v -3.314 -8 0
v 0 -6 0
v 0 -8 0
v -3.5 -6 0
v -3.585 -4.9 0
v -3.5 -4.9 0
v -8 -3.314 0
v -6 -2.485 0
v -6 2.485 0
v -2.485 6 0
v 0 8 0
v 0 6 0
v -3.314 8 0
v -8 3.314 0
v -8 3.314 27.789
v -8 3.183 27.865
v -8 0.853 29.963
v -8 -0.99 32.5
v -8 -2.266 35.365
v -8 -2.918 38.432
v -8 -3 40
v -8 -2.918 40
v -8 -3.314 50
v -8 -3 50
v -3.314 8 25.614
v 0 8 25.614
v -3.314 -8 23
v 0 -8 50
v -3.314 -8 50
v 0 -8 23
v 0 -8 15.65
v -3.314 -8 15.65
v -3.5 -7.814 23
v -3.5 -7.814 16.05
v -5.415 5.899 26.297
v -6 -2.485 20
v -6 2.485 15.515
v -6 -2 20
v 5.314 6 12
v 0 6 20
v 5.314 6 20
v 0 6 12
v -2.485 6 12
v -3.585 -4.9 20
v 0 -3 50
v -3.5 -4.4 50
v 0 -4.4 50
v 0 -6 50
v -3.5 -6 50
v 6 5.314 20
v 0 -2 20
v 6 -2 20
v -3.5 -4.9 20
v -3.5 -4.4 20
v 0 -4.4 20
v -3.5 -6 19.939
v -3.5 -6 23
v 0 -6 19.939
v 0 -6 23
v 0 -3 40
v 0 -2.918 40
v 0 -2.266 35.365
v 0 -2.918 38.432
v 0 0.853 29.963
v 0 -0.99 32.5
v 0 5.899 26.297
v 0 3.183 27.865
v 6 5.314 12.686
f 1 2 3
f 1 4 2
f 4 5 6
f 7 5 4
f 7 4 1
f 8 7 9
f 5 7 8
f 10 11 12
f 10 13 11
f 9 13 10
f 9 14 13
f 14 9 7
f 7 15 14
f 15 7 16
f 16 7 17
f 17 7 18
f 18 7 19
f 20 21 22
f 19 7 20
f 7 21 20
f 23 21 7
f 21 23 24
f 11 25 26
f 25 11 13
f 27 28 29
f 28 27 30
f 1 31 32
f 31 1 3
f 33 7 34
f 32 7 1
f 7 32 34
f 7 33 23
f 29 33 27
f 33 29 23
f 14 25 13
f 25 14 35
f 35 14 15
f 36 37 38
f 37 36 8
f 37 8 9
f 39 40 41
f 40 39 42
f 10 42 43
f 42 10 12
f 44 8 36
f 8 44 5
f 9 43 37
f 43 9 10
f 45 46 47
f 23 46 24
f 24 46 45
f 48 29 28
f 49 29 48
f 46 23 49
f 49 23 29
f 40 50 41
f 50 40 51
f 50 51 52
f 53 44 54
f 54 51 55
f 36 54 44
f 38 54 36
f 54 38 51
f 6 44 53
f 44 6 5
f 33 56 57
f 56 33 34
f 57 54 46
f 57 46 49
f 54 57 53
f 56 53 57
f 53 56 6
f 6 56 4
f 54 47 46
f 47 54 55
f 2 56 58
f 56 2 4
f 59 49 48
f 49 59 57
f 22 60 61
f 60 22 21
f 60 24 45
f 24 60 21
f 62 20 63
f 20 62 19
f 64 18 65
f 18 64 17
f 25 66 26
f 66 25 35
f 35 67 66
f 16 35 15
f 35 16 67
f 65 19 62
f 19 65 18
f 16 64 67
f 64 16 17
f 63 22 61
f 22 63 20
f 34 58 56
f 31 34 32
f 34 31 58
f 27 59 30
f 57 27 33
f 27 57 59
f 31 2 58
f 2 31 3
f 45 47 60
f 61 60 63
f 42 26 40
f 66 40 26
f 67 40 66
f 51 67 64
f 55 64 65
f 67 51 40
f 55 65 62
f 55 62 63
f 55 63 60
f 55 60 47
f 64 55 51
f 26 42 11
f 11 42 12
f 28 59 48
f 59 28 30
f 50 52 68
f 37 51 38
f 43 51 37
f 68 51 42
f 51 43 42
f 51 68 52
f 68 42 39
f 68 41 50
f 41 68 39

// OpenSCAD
// An attempt at a hoctagonal tin whistle
module octocyl(r=5,length=60) {

	xd=2*sqrt(r*r/2);

	difference() {


		translate([-r,-r,0]) cube([2*r,2*r,length]);



		translate([xd,xd,0])   rotate([0,0,45]) translate([-r,-r,0]) cube([2*r,2*r,length]);
		translate([-xd,-xd,0]) rotate([0,0,45]) translate([-r,-r,0]) cube([2*r,2*r,length]);
		translate([-xd,xd,0])  rotate([0,0,45]) translate([-r,-r,0]) cube([2*r,2*r,length]);
		translate([xd,-xd,0])  rotate([0,0,45]) translate([-r,-r,0]) cube([2*r,2*r,length]);
	}
}

module octotube(r1=5, r2=4,length=60) {

	difference() {
		octocyl(r1,length);
		octocyl(r2,length);
	}

}

	
module bottom(length) {
	translate([-80,0,0]) difference() {
		octotube(r1=20,r2=14,length=l);
		translate([0,0,l-10]) octotube(r1=17,r2=14,length=l);
	}
}
 	
module middle(length) {

	translate([-180,0,0]) difference() {
		octotube(r1=20,r2=14,length=l);
		translate([0,0,l-10]) octotube(r1=20,r2=17,length=l);
	}
}


module fipbase(radius,length) {
	difference() {

		union() {
			//octotube(r1=radius,r2=radius-2,length=20);
			translate([0,0,0]) octotube(r1=radius,r2=radius-2,length=length+20);
		
			// backstop and mouthpeice 
			translate([0,0,length]) octocyl(r=radius,length=30);
			
			//windhole extrude
			translate([-(radius)/2,-radius+1.5,0]) cube([radius,radius/5,length]);	 	}

		// Windhole
		translate([-(radius-1)/2,-radius+2,0]) cube([radius-1,radius/5,100]);

		// Mouthpeice cutaway
		translate([-30,-3,length+20]) cube([60,60,60]);
		translate([-30,12,length+20]) rotate([0,90,0]) cylinder(r=15,h=60);  
		translate([-30,41,length+20]) rotate([45,0,0]) cube([60,60,60]);


	}
}

module hole(r) {
	width=r-1;
	translate([-width/2,-30,-10]) difference() {
		rotate([-25,0,0]) cube([width,10,25]);
		translate([0,0,18]) cube([width,20,10]);
	}
}

module brace(r) {
	width=3/2*r;	
	c1 = sqrt(2*r*r);

	difference() {
		translate([0,2,r/2]) rotate([180,0,0]) difference() {
			cube([width,r,r],center=true);
			translate([0,r/2,r/2]) rotate([45,0,0]) cube([width,c1,c1],center=true);
		}
		octotube(r2=r,r1=r+2,length=r);
	}
}


l=95;
r=8;
//bottom(l);
//middle(l);
difference() {
	fipbase(r,20);
	translate([0,6,15]) hole(r);
	translate([0,-100,0]) cube([200,200,200]);
}


translate([0,0,12]) brace(r);




		
